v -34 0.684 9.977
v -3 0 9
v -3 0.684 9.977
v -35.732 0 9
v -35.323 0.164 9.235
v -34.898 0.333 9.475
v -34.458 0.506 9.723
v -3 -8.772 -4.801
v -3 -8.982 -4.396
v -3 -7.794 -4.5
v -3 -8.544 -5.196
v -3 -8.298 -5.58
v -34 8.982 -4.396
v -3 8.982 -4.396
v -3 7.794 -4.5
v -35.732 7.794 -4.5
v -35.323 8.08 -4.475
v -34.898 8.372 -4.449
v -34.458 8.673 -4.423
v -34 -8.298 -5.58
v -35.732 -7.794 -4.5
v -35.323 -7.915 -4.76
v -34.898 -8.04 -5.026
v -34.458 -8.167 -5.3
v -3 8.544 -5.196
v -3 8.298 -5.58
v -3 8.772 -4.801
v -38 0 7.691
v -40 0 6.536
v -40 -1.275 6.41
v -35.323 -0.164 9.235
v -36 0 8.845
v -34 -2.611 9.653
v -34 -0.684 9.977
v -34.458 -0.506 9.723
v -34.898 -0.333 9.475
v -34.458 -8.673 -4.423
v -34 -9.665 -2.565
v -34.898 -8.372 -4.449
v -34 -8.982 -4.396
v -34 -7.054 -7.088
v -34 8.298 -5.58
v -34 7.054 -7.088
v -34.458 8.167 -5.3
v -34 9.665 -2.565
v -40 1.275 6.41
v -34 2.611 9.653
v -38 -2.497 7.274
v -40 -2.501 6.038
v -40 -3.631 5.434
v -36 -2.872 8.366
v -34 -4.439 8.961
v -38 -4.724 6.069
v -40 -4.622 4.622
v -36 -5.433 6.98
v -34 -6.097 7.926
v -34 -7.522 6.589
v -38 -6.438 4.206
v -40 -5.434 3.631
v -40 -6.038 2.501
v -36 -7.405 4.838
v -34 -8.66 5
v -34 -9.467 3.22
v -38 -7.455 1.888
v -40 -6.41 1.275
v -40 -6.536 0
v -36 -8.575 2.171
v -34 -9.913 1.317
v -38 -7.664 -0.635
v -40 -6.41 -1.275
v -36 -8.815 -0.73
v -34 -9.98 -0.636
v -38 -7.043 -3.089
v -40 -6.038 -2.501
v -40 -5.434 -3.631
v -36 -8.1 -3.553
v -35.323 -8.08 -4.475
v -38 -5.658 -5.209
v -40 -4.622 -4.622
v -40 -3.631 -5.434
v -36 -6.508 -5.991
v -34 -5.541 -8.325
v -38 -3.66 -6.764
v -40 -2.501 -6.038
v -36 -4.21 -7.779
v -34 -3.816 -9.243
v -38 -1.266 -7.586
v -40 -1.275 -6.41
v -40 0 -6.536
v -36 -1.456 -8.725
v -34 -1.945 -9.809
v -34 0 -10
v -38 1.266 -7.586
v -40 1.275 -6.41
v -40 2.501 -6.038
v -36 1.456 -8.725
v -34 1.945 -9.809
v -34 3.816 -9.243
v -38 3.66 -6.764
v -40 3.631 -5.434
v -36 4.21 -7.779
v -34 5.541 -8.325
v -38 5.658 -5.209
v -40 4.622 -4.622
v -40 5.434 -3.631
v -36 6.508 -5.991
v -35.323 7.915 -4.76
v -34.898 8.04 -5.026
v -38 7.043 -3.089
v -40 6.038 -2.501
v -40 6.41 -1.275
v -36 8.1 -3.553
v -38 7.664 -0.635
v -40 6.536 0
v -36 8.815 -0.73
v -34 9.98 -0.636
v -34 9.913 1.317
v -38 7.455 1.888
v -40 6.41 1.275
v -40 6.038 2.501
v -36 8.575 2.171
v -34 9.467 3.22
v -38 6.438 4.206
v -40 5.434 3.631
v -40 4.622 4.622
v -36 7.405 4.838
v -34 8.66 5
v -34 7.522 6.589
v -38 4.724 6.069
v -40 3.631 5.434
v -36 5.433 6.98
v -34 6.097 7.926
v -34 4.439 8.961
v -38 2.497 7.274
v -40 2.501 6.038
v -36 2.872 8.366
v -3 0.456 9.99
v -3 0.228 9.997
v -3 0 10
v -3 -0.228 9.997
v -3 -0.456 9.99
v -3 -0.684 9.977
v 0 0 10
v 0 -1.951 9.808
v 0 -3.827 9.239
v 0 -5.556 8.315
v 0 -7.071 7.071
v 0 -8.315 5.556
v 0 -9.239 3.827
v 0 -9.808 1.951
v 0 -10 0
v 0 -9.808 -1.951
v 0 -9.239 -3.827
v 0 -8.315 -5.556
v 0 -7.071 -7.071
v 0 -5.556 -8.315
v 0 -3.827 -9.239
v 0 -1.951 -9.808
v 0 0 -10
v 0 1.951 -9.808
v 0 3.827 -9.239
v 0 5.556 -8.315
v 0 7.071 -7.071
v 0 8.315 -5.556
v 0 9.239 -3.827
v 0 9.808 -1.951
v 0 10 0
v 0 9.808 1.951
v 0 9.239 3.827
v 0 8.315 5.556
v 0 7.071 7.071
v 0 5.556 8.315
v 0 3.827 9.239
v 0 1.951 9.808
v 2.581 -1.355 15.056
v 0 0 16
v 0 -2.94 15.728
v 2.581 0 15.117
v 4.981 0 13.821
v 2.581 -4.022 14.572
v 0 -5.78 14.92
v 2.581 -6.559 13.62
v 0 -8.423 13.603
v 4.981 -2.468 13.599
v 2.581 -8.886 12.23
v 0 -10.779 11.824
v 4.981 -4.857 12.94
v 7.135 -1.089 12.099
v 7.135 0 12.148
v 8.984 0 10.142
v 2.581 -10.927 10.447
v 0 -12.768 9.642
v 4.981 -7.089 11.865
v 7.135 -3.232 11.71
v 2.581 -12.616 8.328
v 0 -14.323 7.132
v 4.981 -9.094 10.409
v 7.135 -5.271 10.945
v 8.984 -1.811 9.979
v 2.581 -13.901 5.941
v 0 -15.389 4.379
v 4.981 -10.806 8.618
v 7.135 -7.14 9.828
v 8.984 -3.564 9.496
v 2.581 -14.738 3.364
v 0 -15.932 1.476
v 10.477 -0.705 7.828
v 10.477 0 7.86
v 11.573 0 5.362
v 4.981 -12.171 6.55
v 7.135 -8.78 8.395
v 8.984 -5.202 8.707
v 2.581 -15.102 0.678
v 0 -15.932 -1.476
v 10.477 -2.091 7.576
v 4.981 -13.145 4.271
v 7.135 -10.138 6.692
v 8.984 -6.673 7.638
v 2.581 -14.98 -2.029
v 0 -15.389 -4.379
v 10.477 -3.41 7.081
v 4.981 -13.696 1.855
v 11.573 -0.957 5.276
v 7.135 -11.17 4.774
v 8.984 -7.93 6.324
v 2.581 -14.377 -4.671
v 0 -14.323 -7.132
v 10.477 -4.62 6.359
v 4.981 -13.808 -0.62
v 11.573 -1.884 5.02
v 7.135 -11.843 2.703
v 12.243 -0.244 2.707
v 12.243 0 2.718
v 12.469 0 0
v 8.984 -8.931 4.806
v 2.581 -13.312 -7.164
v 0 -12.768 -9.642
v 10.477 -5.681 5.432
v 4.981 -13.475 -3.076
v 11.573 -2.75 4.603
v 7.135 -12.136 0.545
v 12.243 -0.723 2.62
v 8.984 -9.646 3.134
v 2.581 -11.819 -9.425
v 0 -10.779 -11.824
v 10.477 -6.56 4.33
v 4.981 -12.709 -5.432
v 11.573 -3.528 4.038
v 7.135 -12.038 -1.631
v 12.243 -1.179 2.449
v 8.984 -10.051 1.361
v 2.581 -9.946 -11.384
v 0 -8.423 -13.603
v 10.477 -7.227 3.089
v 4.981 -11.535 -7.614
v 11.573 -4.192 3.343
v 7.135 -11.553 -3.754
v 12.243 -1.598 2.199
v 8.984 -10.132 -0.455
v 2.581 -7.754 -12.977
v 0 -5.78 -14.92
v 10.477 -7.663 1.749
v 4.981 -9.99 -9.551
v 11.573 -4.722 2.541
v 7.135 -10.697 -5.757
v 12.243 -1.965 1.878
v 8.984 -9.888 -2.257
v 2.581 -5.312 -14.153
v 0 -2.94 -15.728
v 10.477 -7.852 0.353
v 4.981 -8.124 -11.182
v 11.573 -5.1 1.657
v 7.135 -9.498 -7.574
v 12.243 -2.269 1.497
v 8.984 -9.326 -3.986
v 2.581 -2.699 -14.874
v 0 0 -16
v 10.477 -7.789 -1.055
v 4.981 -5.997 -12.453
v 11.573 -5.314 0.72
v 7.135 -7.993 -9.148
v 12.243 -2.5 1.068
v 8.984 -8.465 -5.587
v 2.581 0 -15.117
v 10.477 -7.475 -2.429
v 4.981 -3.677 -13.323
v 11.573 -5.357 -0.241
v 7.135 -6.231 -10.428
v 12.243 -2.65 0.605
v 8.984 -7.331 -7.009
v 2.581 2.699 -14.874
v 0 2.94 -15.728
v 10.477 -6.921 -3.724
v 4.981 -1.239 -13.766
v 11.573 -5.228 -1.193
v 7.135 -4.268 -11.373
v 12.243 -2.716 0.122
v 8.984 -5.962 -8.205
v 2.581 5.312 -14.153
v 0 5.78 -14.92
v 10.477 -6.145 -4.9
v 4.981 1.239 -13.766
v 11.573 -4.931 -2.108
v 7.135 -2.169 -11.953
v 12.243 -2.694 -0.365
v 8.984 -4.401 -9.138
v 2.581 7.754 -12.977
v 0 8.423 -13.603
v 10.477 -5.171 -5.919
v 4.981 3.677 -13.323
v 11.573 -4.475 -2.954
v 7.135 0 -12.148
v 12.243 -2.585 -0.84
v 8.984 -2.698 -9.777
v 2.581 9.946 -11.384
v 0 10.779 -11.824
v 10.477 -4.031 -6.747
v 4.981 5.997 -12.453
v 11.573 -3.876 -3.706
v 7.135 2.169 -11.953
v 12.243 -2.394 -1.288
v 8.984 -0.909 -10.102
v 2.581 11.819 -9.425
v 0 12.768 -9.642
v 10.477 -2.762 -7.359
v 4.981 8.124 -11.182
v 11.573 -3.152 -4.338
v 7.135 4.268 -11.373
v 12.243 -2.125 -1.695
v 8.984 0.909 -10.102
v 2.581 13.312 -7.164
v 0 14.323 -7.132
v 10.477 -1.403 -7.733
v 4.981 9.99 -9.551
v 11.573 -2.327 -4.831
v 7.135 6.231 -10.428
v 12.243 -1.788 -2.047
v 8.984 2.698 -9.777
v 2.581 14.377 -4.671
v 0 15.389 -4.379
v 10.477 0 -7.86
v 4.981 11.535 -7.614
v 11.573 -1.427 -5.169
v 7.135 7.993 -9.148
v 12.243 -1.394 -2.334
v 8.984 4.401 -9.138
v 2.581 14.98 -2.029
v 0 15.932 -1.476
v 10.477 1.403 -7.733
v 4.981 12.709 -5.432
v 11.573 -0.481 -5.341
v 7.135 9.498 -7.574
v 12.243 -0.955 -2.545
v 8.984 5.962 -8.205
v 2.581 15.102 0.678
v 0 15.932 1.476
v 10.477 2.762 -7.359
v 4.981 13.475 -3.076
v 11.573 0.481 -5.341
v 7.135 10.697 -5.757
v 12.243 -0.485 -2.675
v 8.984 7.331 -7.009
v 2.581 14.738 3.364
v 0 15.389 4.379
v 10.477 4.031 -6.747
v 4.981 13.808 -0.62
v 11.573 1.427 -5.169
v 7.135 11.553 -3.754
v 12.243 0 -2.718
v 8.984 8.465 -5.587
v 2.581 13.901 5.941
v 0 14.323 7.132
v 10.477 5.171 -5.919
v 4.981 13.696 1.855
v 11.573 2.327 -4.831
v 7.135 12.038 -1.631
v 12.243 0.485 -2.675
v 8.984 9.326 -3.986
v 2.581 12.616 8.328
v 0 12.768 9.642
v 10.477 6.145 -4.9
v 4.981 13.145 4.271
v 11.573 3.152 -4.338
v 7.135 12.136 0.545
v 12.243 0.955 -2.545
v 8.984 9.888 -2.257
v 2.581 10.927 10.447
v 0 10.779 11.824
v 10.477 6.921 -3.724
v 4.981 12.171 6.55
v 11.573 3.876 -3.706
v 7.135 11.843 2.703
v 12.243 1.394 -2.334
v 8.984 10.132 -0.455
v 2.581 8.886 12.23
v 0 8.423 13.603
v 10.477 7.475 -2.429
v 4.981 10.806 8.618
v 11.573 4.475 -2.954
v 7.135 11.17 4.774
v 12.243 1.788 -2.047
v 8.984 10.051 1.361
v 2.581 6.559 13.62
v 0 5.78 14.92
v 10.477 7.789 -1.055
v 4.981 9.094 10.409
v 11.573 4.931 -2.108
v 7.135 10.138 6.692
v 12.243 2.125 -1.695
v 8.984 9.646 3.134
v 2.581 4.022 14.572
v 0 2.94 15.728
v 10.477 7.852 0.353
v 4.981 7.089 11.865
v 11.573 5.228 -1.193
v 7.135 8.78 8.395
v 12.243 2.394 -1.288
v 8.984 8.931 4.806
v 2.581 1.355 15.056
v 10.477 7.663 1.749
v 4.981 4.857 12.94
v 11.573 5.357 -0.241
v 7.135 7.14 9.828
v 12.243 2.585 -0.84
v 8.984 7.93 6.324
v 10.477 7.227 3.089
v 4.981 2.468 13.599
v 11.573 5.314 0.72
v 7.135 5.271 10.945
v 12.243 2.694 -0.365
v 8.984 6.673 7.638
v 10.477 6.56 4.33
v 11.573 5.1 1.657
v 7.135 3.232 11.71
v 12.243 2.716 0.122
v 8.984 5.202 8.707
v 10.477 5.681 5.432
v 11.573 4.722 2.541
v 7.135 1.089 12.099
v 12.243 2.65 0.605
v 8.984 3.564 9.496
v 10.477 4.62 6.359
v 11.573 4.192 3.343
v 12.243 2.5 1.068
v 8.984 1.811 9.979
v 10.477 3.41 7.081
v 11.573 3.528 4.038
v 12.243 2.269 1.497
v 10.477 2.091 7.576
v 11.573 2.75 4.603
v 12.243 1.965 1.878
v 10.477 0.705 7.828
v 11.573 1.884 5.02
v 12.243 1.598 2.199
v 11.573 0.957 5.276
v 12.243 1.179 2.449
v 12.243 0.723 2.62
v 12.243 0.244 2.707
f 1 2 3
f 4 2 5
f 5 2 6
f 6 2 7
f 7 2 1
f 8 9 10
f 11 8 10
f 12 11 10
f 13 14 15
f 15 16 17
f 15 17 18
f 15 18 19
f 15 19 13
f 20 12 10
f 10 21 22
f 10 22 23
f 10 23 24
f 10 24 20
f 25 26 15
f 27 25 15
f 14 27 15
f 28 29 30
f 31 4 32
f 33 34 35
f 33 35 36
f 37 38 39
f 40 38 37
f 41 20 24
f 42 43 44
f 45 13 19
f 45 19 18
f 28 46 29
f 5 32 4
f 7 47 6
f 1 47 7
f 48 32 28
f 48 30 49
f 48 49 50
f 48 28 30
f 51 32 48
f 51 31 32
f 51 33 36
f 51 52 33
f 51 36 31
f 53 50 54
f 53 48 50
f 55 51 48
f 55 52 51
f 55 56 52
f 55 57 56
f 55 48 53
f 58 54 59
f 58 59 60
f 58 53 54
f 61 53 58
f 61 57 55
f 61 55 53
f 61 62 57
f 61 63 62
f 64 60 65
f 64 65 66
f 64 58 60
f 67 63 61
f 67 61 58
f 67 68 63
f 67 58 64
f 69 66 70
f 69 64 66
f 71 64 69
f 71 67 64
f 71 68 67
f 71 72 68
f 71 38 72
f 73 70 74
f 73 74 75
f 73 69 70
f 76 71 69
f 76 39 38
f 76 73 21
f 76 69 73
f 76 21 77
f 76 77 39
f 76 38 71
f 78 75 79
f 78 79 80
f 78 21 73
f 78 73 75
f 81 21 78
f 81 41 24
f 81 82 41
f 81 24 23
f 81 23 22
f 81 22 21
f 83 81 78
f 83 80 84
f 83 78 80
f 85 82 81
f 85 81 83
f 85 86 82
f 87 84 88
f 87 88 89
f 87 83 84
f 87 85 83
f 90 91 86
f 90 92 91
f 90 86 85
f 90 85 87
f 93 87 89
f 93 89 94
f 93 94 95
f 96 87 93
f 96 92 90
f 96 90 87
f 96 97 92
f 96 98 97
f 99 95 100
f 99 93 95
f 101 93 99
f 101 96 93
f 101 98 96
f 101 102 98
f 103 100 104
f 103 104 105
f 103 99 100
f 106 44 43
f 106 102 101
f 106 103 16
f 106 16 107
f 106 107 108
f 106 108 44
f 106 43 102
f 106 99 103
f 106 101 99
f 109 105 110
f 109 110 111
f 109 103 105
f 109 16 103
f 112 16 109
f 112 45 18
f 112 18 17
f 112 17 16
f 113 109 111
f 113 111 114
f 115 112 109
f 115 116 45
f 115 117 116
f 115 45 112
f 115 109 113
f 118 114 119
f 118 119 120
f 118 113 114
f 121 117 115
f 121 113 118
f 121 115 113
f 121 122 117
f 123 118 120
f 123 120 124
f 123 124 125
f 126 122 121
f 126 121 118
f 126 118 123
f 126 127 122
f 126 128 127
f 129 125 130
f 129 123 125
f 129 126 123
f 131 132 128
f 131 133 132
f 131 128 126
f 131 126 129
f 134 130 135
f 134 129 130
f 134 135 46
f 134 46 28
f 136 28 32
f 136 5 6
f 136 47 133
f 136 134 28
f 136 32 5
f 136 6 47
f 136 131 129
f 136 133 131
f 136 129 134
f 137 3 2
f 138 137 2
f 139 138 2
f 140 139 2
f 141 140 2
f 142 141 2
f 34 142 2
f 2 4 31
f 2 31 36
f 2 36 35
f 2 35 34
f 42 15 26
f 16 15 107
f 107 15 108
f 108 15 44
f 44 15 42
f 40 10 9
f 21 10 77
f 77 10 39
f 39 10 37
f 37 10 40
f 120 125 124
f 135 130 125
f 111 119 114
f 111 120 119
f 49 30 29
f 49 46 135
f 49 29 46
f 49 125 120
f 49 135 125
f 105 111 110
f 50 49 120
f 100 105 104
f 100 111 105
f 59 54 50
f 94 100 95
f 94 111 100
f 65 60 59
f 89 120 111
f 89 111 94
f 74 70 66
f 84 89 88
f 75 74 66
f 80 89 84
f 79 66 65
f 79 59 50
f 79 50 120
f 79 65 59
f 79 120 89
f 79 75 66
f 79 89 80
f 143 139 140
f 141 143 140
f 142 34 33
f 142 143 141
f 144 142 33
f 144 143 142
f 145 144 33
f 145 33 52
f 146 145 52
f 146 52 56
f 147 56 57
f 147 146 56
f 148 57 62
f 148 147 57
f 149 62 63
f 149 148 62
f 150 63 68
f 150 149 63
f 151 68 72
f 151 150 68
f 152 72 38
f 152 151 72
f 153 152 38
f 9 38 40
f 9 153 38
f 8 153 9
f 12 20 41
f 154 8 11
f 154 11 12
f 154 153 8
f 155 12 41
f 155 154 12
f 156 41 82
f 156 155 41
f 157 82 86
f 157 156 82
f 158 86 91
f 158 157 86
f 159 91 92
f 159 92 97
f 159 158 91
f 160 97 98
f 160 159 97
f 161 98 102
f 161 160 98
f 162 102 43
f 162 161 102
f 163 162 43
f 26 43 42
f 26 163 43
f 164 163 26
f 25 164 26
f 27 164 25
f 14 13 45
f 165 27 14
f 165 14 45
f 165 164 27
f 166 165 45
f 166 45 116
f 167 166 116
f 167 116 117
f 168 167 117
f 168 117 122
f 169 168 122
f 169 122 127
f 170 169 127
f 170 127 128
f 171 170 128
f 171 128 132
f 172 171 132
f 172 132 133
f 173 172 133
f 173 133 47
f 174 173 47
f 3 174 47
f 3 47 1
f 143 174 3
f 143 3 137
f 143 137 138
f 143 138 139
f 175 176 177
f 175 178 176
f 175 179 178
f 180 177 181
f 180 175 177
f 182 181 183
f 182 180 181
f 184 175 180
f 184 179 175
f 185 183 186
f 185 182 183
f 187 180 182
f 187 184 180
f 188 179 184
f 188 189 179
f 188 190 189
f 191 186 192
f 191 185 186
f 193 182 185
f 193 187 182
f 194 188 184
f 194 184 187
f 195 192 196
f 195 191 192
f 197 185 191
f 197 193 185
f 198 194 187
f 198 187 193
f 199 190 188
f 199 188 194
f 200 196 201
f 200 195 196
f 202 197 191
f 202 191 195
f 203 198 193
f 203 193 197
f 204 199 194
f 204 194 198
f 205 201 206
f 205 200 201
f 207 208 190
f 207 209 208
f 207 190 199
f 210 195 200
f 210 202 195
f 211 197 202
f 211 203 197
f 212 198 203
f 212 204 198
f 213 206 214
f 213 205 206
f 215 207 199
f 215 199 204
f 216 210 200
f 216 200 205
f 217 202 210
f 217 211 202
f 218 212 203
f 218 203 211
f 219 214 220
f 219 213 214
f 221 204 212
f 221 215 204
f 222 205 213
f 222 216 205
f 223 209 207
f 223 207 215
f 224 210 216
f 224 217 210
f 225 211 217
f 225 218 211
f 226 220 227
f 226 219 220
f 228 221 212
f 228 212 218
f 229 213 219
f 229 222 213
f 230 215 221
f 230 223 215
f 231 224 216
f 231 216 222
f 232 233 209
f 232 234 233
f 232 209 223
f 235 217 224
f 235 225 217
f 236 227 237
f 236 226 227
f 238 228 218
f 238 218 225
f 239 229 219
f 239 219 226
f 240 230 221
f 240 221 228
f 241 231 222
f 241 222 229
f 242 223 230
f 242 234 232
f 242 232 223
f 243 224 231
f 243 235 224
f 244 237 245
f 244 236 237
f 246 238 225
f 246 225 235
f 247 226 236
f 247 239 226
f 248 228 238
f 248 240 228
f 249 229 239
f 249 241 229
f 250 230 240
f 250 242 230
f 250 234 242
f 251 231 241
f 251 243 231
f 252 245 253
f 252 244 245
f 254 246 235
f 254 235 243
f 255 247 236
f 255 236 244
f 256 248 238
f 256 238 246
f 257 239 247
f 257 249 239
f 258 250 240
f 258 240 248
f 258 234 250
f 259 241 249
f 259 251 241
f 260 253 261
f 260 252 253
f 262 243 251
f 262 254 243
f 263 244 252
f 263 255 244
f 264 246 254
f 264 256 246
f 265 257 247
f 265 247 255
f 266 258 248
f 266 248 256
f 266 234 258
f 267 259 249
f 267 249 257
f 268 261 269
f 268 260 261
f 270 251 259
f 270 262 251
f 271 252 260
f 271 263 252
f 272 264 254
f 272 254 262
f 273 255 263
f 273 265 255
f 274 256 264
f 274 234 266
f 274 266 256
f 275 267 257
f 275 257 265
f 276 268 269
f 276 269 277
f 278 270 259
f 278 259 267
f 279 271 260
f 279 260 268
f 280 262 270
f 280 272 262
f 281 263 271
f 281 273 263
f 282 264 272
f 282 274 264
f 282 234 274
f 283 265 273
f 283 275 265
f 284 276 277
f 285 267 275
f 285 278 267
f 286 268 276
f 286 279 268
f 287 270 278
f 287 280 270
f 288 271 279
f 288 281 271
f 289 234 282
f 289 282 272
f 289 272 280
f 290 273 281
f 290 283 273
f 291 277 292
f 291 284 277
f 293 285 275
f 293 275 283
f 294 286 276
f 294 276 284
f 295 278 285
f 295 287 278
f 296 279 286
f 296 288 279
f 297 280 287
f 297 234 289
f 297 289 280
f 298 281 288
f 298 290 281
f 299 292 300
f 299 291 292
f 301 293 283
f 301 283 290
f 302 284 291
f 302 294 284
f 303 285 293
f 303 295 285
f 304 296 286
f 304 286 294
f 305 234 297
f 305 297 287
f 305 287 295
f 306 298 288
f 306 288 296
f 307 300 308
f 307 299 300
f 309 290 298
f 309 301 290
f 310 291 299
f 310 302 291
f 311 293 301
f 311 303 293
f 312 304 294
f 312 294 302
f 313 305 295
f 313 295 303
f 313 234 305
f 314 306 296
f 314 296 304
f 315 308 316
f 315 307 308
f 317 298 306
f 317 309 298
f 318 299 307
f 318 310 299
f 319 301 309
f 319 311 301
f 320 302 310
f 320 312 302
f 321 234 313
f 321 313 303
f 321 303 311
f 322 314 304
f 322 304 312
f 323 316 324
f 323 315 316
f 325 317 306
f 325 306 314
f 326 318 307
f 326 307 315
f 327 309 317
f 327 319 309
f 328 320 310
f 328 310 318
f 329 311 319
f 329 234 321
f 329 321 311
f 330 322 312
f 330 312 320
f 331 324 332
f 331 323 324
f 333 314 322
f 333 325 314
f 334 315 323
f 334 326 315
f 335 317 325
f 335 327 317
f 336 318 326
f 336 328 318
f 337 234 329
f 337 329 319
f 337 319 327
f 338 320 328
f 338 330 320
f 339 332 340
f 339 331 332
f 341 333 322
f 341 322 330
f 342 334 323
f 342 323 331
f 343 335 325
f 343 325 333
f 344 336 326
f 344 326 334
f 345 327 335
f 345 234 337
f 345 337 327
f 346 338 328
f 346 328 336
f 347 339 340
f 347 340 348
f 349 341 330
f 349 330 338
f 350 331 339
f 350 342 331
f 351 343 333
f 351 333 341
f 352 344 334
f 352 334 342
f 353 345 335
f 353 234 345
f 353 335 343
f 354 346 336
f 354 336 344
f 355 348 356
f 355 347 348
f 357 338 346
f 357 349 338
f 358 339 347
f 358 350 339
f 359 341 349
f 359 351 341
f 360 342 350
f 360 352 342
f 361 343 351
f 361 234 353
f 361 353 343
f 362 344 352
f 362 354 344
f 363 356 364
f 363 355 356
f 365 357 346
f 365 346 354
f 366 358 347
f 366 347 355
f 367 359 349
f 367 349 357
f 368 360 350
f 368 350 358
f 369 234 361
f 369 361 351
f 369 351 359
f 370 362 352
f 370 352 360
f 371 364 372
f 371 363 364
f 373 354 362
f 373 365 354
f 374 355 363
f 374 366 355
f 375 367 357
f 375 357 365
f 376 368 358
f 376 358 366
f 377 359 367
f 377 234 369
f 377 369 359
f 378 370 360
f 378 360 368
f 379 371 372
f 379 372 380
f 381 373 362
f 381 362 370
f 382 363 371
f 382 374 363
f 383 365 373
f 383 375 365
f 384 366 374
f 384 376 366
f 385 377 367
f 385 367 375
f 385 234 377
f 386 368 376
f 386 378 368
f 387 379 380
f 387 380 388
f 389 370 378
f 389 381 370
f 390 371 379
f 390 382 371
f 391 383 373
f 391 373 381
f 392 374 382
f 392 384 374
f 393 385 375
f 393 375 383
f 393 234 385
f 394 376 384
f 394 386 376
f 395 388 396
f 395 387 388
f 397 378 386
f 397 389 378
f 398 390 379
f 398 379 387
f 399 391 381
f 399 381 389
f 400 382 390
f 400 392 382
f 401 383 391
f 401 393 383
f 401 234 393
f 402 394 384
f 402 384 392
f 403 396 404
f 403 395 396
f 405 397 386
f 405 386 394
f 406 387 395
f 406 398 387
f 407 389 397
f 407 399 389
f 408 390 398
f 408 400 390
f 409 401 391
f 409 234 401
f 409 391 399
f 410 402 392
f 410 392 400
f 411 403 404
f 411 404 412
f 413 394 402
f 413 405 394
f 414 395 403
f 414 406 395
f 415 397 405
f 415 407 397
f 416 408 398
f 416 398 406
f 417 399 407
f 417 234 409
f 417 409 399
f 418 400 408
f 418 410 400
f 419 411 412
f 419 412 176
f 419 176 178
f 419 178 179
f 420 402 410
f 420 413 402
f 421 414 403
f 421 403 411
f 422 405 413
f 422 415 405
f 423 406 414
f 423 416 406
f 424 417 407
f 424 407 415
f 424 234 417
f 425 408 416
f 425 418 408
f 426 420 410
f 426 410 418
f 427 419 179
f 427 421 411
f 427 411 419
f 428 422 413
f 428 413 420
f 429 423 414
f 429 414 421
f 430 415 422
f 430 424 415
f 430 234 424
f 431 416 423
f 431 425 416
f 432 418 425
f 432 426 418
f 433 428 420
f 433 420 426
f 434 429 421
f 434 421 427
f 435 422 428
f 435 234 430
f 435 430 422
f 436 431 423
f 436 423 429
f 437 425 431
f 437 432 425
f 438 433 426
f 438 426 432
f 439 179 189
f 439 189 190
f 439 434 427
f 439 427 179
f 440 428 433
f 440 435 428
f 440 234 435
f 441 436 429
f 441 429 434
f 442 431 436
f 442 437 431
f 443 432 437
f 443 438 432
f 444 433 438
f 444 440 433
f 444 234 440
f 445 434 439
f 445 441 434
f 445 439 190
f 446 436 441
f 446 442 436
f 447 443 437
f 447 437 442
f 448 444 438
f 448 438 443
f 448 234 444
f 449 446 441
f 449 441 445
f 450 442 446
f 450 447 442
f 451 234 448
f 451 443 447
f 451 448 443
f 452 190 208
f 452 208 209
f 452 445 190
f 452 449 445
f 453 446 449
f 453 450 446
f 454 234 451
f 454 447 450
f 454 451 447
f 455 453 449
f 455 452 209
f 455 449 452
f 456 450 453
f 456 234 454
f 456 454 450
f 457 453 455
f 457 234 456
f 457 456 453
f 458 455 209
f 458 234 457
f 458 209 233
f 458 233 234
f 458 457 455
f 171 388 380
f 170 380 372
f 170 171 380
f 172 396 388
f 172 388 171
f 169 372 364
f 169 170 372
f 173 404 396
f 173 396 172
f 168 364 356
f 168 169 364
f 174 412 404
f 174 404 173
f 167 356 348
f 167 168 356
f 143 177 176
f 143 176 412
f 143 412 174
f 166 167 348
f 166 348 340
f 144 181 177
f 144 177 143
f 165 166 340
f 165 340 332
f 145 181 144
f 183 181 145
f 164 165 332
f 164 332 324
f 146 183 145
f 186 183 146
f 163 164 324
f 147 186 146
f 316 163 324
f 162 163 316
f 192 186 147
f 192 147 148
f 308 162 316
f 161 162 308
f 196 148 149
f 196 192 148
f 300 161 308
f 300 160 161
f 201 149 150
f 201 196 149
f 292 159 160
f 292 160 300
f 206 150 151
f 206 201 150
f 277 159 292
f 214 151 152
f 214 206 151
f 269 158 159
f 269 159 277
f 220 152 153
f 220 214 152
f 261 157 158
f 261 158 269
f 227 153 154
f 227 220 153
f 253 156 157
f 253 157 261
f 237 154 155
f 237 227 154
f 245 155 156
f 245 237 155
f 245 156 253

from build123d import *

# Parameters (mm, degrees)
CUT_EXTRUDE1_DEPTH = 37
CIRPATTERN1_COUNT  = 3


with BuildPart() as part:
    # Sketch1 → Base-Revolve (revolve)
    with BuildSketch(Plane.XY, mode=Mode.PRIVATE) as base_revolve_sk:
        with BuildLine():
            Line((-40, 0), (-40, 6.535898385))
            Line((-40, 6.535898385), (-34, 10))
            Line((-34, 10), (0, 10))
            Line((0, 10), (0, 16))
            ThreePointArc((0, 16), (8.983547964, 10.142395515), (12.468871126, 0))
            Line((12.468871126, 0), (-40, 0))
        make_face()
    revolve(base_revolve_sk.sketch.rotate(Axis((-40, 0, 0), (1, 0, 0)), 90), axis=Axis((-40, 0, 0), (1, 0, 0)))

    # Sketch2 → Cut-Extrude1 (cut)
    with BuildSketch(Plane.ZY.offset(40)):
        Polygon((9, 0), (10, 0.700207538), (10, -0.700207538), align=None)
    cut_extrude1 = extrude(amount=-CUT_EXTRUDE1_DEPTH, mode=Mode.SUBTRACT)

    # CirPattern1: Cut-Extrude1 ×3 about axis
    cirpattern1_axis = Axis((0, 0, 0), (1, 0, 0))
    for i in range(1, CIRPATTERN1_COUNT):
        add(cut_extrude1.rotate(cirpattern1_axis, i * 360 / CIRPATTERN1_COUNT), mode=Mode.SUBTRACT)


solid = part.part
